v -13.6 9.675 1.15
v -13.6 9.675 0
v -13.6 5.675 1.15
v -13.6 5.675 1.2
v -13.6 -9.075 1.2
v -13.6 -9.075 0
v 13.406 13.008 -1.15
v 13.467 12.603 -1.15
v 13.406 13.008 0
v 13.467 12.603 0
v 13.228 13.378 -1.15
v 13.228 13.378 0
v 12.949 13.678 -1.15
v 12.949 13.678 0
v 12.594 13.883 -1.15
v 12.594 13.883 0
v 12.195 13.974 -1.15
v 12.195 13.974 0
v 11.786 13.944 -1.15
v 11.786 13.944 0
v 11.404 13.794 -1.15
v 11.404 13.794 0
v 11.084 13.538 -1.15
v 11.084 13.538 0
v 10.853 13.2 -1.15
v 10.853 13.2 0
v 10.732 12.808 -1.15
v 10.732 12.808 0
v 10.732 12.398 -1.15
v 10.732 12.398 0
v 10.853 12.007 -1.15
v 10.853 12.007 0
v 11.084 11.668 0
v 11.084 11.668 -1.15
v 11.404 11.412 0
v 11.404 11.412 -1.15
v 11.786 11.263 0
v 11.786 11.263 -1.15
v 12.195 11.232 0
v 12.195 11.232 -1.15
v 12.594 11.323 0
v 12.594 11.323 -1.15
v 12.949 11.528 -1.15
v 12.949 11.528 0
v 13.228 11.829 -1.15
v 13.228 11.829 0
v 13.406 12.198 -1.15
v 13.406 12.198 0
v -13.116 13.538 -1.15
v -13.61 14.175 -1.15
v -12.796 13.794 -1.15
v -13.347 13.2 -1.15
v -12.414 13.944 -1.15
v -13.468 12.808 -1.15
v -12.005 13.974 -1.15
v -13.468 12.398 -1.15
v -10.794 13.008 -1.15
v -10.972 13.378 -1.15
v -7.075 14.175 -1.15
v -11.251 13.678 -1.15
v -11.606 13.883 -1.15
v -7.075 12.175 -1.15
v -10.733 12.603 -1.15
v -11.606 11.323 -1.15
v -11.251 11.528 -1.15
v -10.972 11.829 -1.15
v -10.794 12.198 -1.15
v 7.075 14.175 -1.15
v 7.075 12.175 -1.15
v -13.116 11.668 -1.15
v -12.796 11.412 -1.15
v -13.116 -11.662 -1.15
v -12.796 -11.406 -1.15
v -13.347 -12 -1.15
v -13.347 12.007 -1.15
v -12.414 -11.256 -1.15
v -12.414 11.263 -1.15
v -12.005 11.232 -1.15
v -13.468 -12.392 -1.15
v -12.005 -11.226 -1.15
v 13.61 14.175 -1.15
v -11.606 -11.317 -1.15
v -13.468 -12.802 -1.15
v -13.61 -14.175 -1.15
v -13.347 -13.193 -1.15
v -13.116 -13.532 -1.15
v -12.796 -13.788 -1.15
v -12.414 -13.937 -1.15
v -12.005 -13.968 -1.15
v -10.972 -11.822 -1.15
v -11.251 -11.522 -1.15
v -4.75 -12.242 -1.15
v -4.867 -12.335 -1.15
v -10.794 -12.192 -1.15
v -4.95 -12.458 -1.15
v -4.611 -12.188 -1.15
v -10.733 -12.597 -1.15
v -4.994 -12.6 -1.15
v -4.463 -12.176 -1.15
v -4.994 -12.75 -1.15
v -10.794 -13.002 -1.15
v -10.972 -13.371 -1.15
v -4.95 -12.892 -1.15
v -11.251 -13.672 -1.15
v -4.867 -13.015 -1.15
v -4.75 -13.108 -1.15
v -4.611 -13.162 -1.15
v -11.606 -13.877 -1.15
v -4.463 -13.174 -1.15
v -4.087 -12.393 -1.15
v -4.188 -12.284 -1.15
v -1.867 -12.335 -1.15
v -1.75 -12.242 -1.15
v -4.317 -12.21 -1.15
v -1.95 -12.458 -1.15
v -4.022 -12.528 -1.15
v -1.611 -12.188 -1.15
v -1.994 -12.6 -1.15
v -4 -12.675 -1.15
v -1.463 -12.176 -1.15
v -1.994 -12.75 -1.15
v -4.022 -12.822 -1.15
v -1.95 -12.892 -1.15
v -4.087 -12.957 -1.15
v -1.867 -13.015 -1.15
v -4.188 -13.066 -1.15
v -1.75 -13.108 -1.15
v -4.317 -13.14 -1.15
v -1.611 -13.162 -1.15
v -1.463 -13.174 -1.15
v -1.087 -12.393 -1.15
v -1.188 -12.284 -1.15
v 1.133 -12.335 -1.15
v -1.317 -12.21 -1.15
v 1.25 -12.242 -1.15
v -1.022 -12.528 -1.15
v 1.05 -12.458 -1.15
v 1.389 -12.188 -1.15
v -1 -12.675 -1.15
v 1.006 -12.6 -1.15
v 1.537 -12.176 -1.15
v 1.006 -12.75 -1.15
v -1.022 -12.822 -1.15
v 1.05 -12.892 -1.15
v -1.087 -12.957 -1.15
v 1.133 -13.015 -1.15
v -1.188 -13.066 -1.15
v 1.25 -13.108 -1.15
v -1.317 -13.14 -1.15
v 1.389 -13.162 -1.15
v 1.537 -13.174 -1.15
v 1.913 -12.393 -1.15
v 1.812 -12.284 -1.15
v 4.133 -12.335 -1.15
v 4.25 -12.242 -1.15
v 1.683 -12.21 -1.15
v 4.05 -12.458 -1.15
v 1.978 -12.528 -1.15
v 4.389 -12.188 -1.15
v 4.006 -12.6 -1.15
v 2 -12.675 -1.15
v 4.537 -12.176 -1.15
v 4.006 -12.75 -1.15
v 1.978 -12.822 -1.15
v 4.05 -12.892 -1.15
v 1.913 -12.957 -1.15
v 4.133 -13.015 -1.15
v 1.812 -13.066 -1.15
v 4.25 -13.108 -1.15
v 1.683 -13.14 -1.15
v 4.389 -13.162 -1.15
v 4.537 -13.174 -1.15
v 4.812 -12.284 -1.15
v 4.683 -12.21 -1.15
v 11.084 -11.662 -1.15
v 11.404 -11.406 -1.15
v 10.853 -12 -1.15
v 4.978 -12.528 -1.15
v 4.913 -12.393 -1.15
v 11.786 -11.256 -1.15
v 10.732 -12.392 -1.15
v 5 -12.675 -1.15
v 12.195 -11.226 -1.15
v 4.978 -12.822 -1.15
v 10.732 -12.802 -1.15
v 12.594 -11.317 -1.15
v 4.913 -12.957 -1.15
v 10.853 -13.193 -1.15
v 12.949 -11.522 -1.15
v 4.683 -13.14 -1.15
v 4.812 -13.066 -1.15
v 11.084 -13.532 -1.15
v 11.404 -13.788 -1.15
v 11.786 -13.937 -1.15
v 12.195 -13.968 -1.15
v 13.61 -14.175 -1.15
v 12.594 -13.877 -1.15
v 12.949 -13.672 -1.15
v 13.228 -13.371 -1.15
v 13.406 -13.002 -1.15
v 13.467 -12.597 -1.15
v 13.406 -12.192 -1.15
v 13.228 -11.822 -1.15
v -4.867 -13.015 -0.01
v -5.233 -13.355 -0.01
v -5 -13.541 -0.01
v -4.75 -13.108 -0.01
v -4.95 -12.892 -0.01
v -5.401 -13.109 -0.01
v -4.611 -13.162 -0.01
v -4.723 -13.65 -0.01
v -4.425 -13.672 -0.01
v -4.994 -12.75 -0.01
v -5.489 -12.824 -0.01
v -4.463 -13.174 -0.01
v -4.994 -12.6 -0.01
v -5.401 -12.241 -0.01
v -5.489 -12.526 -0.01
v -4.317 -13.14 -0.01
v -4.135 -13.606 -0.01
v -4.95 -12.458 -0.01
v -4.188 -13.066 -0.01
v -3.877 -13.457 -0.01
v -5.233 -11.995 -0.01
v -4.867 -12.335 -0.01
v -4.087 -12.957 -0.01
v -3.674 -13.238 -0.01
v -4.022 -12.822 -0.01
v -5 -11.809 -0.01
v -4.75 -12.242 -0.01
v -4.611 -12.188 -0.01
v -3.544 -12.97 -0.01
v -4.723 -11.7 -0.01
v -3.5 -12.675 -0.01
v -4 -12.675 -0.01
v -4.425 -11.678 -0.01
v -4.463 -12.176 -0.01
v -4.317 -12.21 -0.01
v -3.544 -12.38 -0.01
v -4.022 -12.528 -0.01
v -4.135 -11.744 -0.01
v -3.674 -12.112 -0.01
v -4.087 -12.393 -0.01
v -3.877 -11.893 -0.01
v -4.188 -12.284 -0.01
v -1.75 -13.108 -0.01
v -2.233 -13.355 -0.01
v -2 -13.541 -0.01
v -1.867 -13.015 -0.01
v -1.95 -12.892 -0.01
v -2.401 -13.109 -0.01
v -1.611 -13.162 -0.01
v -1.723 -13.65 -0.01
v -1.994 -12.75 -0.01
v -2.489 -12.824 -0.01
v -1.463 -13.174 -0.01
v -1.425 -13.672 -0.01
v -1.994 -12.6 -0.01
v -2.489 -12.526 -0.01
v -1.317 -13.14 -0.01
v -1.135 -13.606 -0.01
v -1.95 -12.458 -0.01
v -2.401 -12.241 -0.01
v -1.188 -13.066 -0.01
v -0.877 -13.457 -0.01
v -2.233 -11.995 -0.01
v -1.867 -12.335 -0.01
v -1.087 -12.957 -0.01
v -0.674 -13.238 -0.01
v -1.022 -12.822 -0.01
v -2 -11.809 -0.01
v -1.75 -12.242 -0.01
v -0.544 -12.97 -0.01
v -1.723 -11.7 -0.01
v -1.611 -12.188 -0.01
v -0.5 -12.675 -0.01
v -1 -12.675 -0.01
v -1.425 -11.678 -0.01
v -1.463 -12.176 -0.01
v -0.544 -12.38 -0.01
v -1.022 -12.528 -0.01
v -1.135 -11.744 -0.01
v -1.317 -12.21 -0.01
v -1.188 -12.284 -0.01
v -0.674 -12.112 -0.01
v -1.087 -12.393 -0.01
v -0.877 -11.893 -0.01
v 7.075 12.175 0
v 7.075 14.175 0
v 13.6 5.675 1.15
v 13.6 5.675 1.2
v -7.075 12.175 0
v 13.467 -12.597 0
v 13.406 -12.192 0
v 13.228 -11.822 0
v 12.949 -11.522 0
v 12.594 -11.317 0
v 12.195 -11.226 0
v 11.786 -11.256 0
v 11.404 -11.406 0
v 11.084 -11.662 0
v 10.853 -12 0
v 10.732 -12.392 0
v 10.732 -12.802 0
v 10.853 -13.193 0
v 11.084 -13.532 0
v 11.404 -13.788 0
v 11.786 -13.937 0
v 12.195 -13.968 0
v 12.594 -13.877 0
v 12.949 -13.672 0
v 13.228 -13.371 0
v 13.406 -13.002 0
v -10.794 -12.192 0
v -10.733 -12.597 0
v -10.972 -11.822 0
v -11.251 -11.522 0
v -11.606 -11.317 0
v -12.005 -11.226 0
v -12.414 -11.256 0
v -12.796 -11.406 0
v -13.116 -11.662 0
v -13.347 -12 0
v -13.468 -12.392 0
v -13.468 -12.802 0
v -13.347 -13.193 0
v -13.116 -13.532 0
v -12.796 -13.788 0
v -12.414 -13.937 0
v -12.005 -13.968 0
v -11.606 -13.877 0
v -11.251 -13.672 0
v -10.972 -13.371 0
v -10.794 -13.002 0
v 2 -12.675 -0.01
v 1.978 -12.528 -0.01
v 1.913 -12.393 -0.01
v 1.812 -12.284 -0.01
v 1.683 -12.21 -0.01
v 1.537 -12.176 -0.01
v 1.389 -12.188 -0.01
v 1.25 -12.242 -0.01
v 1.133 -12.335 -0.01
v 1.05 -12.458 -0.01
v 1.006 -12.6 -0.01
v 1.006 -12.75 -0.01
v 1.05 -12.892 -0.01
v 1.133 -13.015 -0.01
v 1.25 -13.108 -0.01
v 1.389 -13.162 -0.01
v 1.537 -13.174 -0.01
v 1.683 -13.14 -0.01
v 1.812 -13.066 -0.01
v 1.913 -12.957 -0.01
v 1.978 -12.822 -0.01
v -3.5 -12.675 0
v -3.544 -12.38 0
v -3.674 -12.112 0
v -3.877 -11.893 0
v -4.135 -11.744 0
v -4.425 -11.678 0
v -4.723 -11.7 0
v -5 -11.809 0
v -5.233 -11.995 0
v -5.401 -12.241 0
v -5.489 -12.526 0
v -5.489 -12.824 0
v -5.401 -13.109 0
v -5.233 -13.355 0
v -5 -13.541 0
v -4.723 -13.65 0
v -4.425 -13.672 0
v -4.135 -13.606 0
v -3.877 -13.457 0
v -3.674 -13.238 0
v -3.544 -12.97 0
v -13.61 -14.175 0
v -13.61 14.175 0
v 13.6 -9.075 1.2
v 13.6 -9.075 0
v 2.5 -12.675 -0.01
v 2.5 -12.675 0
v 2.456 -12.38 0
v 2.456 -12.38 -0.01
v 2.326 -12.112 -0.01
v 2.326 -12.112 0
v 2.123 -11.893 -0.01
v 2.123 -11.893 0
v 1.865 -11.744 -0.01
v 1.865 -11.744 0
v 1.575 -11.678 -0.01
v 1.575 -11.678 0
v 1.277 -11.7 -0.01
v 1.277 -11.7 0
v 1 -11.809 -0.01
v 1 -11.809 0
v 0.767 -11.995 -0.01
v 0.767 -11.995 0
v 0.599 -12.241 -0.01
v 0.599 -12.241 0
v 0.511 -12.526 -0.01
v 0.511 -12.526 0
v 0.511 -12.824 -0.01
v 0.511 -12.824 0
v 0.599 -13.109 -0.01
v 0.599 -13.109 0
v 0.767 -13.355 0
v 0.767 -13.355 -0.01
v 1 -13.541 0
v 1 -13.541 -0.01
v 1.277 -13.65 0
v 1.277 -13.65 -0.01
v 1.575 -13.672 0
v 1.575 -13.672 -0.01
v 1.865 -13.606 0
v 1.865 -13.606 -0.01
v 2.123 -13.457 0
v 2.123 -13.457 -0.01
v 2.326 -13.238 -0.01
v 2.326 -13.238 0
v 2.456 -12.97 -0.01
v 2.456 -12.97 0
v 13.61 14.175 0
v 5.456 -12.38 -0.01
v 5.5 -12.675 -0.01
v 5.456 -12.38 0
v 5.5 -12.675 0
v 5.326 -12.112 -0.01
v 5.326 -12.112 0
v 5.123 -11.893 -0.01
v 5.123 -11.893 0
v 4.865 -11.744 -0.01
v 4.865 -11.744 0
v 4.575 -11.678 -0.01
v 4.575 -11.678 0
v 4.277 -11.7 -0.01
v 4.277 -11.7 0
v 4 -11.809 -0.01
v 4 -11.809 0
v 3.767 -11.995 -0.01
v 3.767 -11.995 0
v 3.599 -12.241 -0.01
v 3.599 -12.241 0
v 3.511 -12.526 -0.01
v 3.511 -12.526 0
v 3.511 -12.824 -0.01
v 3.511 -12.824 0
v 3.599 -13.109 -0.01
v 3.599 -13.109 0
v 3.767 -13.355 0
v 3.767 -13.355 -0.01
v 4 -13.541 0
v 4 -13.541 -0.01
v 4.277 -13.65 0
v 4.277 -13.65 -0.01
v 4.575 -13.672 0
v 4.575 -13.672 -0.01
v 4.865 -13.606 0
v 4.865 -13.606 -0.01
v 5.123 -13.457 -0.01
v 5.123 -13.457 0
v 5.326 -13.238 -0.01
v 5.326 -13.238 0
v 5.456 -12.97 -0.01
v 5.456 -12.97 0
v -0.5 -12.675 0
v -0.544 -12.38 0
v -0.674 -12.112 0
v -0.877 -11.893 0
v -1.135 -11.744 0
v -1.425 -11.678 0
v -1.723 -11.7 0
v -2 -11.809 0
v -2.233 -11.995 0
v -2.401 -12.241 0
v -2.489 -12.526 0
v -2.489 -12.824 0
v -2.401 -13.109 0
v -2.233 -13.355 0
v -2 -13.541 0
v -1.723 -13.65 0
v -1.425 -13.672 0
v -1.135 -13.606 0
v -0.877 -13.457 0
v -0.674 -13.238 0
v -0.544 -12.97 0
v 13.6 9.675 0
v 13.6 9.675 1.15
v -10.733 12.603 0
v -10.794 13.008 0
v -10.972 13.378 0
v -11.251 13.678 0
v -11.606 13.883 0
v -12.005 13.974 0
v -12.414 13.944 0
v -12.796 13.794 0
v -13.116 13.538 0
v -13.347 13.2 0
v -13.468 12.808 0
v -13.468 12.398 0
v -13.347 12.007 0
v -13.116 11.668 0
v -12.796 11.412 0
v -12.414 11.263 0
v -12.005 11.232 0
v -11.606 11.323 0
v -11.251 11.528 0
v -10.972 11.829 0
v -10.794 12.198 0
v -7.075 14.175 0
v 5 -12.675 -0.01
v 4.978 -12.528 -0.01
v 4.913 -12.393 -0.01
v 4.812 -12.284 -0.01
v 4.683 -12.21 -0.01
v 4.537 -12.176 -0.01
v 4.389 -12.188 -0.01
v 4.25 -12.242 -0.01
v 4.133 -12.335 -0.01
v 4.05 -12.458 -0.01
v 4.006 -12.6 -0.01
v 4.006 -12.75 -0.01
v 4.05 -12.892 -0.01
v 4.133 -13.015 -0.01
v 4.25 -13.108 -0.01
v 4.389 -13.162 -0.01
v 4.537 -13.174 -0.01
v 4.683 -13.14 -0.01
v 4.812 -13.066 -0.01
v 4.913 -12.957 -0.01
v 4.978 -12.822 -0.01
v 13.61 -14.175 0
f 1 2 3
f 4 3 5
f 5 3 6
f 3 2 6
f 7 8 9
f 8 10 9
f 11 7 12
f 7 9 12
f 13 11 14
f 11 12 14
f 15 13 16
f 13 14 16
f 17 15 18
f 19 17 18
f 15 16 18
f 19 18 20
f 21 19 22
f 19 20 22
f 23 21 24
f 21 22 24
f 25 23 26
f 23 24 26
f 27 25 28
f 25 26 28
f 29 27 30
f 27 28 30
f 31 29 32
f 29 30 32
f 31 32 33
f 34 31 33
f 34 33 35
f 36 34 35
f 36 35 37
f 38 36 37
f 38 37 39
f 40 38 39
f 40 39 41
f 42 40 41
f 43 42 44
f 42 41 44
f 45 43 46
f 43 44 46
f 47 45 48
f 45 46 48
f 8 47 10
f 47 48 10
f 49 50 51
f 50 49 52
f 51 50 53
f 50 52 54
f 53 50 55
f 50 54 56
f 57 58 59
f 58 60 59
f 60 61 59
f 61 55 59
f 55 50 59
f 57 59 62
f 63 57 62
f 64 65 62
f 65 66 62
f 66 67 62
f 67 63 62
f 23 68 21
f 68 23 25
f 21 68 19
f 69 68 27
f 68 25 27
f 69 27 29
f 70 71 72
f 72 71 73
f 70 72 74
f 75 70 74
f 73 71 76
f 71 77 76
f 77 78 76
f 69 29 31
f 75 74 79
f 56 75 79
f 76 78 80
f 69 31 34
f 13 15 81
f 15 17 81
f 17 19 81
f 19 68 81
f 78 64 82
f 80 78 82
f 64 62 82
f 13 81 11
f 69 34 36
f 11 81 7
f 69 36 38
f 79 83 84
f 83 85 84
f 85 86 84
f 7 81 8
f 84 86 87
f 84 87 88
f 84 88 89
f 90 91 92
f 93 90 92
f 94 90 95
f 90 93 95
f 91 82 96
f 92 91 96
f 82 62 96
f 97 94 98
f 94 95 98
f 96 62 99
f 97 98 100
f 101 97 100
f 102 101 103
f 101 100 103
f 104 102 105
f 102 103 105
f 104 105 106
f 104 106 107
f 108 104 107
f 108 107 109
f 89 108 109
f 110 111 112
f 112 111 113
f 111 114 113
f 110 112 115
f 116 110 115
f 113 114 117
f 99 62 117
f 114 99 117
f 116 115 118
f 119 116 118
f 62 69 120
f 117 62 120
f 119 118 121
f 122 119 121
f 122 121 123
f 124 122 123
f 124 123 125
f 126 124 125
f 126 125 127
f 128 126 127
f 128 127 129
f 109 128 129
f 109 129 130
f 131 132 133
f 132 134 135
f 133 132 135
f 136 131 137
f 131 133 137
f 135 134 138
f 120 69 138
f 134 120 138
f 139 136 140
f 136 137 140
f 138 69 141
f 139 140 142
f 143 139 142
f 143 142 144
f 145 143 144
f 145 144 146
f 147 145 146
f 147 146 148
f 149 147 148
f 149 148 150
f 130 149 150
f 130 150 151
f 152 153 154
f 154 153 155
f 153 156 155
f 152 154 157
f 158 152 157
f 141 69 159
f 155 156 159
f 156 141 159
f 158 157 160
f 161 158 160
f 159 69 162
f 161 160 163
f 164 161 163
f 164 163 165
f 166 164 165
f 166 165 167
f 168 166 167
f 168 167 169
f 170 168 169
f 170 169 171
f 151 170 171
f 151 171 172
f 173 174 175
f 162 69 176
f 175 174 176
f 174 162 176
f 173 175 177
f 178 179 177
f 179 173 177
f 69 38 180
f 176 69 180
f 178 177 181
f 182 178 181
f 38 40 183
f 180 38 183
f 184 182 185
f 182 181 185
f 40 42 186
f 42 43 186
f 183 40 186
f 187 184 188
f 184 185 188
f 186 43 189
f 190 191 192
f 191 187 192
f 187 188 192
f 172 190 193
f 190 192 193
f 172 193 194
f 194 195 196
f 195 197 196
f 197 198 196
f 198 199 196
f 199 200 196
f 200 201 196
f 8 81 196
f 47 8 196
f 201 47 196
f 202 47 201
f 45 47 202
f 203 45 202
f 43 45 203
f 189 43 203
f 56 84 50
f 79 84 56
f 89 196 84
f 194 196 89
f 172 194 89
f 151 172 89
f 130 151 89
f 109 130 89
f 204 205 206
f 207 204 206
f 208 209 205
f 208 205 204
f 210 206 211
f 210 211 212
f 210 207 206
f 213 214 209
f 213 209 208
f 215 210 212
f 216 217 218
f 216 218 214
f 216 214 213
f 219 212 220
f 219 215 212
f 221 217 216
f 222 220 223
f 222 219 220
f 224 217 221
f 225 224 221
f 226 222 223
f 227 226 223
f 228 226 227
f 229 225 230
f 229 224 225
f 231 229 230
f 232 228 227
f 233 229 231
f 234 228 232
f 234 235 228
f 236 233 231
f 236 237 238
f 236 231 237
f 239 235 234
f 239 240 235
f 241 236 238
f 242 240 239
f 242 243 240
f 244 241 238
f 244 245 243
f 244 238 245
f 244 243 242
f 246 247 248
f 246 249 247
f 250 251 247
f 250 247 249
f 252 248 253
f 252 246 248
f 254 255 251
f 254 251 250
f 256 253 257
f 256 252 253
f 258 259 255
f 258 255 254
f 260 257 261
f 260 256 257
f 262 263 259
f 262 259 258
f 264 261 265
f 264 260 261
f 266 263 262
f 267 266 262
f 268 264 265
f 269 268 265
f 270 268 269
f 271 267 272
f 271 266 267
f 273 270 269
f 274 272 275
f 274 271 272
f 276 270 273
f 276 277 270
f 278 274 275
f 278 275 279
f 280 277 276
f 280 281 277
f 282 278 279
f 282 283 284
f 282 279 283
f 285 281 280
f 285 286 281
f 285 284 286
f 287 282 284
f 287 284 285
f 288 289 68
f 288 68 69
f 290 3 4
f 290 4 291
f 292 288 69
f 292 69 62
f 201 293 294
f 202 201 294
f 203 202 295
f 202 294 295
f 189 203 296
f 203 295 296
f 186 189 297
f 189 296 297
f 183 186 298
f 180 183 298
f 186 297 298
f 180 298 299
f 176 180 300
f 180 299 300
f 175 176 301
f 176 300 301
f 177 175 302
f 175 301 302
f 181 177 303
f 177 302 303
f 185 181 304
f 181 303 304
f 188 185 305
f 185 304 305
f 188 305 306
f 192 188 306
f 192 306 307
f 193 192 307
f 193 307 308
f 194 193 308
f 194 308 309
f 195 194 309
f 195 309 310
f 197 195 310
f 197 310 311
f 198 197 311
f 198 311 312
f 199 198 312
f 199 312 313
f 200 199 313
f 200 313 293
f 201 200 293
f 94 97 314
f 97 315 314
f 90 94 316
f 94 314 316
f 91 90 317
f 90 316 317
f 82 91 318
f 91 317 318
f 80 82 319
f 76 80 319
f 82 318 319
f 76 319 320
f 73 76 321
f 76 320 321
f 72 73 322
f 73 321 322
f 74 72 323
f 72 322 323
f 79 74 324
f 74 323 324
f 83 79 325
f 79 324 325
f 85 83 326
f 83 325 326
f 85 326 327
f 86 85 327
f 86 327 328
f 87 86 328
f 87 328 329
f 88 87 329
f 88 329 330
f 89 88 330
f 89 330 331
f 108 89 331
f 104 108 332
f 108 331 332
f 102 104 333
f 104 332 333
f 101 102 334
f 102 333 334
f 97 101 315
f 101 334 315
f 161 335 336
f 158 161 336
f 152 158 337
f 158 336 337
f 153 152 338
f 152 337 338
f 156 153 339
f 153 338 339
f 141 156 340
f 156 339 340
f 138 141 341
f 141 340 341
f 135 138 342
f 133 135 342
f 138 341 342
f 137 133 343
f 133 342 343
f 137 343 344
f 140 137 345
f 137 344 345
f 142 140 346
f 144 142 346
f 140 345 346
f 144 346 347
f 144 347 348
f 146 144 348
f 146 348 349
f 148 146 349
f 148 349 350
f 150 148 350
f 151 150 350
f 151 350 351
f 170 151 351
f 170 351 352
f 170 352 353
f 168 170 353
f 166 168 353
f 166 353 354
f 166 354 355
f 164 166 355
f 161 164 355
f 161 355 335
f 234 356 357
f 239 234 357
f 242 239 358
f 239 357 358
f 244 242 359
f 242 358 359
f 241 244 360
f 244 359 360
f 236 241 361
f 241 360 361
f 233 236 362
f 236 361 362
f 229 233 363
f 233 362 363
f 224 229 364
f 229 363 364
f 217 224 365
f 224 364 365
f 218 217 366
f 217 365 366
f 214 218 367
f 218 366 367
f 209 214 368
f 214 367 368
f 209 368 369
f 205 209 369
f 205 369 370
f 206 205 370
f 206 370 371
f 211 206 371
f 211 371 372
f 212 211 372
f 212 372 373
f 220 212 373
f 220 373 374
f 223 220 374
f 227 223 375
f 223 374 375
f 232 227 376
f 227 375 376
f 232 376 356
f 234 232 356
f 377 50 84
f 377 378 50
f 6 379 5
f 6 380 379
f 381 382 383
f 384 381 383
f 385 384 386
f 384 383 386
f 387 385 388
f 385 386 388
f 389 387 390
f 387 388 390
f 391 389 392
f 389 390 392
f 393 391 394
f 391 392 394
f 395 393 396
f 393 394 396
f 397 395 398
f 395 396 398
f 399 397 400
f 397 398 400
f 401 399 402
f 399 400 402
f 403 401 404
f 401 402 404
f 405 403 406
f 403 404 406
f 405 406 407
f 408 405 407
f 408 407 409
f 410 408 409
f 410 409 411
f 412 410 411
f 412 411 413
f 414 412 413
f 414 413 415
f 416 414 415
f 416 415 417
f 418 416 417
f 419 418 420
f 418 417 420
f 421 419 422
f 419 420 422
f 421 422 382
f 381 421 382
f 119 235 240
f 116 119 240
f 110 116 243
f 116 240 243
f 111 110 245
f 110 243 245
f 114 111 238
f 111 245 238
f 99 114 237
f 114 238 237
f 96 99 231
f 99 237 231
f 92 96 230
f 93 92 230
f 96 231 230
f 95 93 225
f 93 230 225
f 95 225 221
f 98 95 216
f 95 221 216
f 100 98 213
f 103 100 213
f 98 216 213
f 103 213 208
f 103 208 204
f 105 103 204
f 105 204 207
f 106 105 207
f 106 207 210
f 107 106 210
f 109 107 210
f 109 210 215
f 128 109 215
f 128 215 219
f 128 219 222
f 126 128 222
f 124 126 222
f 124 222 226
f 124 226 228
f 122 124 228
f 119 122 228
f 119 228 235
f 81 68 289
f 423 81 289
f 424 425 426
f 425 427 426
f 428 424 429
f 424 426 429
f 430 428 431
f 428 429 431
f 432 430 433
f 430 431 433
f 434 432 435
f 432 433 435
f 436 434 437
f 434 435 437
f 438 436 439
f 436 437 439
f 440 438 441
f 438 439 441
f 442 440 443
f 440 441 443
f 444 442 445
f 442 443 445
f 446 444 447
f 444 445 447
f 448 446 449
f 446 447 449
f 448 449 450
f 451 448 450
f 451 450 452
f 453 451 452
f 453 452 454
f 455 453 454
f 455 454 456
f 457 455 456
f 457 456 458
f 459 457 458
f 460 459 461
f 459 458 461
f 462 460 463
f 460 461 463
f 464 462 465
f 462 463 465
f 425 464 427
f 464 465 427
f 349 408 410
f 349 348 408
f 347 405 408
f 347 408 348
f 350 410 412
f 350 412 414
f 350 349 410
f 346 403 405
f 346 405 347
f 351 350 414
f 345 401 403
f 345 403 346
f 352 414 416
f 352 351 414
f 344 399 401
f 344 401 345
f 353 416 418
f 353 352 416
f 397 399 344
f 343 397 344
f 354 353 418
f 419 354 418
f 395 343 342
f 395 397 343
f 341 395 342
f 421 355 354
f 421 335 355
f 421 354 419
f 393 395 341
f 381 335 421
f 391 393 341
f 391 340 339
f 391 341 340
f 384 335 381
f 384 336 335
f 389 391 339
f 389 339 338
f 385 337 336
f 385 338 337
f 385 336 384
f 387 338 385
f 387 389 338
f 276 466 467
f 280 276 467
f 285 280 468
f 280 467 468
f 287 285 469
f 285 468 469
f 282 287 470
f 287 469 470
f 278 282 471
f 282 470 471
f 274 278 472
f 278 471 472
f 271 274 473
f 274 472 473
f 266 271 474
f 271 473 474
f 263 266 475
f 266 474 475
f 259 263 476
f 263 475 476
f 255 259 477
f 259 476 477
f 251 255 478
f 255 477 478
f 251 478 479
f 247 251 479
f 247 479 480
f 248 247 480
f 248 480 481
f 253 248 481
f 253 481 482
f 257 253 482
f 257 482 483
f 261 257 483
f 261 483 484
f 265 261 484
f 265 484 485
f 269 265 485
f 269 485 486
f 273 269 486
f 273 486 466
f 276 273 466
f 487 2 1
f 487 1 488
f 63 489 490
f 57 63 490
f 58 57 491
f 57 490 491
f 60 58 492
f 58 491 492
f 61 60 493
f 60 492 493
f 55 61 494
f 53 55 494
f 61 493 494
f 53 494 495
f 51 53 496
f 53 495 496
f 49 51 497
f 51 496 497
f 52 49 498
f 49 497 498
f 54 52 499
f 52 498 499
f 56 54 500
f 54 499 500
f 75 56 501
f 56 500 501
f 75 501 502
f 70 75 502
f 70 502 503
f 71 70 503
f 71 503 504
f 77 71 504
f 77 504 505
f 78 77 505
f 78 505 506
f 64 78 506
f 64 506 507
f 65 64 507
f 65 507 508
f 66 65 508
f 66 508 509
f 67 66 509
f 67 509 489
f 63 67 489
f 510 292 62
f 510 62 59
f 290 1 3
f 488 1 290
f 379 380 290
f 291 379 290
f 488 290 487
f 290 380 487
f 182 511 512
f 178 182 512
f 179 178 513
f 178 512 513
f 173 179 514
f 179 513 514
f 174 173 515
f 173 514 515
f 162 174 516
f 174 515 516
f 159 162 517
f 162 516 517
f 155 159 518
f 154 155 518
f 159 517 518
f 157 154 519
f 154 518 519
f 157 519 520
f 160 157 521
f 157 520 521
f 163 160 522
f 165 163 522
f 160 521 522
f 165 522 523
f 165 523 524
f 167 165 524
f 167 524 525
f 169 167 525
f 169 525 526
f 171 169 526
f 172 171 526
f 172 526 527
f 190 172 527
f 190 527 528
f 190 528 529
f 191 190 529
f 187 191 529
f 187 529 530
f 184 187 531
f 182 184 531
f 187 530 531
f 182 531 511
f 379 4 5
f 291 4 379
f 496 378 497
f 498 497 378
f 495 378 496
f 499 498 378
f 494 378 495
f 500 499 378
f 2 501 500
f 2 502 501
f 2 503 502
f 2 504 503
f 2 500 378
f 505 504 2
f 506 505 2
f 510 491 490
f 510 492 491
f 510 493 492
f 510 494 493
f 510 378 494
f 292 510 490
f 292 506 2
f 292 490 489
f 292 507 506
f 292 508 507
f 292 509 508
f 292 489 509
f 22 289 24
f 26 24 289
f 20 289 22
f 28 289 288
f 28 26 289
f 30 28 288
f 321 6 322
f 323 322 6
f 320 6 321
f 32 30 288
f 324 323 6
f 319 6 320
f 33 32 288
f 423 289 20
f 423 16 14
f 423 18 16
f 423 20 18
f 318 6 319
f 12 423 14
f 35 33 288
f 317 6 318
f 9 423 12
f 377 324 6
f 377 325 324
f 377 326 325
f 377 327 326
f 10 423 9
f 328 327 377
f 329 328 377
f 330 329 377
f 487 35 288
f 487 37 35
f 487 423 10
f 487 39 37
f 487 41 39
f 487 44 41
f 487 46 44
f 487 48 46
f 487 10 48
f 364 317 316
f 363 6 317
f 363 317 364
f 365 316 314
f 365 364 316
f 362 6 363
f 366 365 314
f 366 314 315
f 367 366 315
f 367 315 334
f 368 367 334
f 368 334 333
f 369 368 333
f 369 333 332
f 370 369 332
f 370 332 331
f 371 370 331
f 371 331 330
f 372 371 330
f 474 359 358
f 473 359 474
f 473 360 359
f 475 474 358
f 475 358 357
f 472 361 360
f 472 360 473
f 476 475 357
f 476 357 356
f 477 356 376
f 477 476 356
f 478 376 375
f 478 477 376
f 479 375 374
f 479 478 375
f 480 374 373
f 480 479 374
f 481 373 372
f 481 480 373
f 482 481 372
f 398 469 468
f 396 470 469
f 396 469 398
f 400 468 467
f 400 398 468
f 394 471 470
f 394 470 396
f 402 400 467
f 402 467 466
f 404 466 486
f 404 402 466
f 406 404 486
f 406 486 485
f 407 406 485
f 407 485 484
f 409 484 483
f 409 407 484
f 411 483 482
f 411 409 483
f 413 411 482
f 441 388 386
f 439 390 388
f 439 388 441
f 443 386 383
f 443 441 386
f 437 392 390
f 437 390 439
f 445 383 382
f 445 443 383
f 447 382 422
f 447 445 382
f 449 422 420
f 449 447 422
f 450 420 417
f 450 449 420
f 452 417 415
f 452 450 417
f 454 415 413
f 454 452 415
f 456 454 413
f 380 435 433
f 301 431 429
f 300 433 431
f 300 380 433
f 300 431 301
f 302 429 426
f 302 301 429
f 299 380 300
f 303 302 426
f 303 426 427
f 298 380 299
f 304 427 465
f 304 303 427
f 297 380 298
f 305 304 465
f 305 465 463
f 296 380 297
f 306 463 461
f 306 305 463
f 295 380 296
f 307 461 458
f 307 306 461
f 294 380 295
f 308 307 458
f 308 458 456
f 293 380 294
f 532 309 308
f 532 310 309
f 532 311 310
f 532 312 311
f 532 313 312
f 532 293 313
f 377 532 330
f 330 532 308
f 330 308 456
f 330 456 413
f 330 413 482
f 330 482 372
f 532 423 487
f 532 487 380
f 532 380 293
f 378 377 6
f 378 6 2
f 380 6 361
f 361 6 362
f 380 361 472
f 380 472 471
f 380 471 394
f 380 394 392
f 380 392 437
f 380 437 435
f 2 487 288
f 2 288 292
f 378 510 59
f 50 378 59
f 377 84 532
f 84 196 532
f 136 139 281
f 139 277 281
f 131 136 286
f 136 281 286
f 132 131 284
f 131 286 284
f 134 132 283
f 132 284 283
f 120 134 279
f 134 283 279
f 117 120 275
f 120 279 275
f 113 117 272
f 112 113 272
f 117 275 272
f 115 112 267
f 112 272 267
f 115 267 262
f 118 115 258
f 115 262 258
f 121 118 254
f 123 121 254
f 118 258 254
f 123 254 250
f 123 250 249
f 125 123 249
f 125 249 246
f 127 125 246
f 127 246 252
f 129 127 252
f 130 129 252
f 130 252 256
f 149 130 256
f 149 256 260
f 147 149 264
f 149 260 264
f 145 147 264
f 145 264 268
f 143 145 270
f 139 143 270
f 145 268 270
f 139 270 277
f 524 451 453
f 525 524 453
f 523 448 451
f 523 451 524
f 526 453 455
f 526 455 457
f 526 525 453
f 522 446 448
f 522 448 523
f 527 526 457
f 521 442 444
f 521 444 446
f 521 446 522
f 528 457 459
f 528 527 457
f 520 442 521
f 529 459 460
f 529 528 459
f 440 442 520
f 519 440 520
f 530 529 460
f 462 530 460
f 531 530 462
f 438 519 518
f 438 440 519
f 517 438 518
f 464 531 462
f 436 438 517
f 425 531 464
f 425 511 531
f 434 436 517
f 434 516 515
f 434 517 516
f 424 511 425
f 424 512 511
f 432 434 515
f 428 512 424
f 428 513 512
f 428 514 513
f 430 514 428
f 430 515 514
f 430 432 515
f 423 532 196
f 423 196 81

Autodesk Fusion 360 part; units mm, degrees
sketch "Sketch1" plane through (0, 0, 0) normal (0, 0, 1) x (1, 0, 0)
  line L0 (13.6, 14.175) -> (-13.6, 14.175)
  line L1 (-13.6, 14.175) -> (-13.6, -14.175)
  line L2 (-13.6, -14.175) -> (13.6, -14.175)
  line L3 (13.6, -14.175) -> (13.6, 14.175)
  line L4 (13.6, 14.175) -> (-13.6, -14.175) construction
  line L5 (-13.6, 14.175) -> (13.6, -14.175) construction
  line L6 (-7.075, 14.175) -> (7.075, 14.175)
  line L7 (7.075, 14.175) -> (7.075, 12.175)
  line L8 (7.075, 12.175) -> (-7.075, 12.175)
  line L9 (-7.075, 12.175) -> (-7.075, 14.175)
  line L10 (-13.6, 9.675) -> (13.6, 9.675)
  line L11 (13.6, 9.675) -> (13.6, -9.075)
  line L12 (13.6, -9.075) -> (-13.6, -9.075)
  line L13 (-13.6, -9.075) -> (-13.6, 9.675)
  line L14 (-13.6, 5.675) -> (13.6, 5.675)
  circle A0 centre (12.0919, 12.6032) radius 1.375
  circle A1 centre (-4.5, -12.675) radius 1
  circle A2 centre (-4.5, -12.675) radius 1
  circle A3 centre (-1.5, -12.675) radius 1
  circle A4 centre (1.5, -12.675) radius 1
  circle A5 centre (4.5, -12.675) radius 1
  line L15 (-4.5, -12.675) -> (4.5, -12.675) construction
  line L16 (0, -14.175) -> (0, -11.175) construction
  circle A6 centre (-4.5, -12.675) radius 0.5
  circle A7 centre (-1.5, -12.675) radius 0.5
  circle A8 centre (1.5, -12.675) radius 0.5
  circle A9 centre (4.5, -12.675) radius 0.5
  circle A10 centre (-12.1081, 12.6032) radius 1.375
  circle A11 centre (12.0919, -12.5968) radius 1.375
  circle A12 centre (-12.1081, -12.5968) radius 1.375
  dimension "d1" = 27.2
  dimension "d2" = 28.35
  dimension "d3" = 14.15
  dimension "d4" = 2
  dimension "d5" = 18.75
  dimension "d6" = 4.5
  dimension "d7" = 4
  dimension "d8" = 2.75
  dimension "d22" = 2
  dimension "d23" = 2
  dimension "d26" = 3
  dimension "d27" = 0
  dimension "d30" = 3
  dimension "d31" = 1
  dimension "d36" = -24.2
  dimension "d37" = -25.2
extrude "Extrude1" add sketch "Sketch1" against normal blind 1.15 contours L0 L1 L3 L7 L8 L9 L10 | L1 L3 L10 L11 L13 L14 | L1 L3 L11 L12 L13 L14 | L1 L2 L3 L12 | A1 A2 | A3 | A4 | A5
extrude "Extrude2" add sketch "Sketch1" along normal blind 1.15 contours L1 L3 L10 L11 L13 L14
extrude "Extrude3" add sketch "Sketch1" along normal blind 1.2 contours L1 L3 L11 L12 L13 L14
sketch "Sketch2" plane through (13.6, 0, 0) normal (1, 0, 0) x (0, 1, 0)
  line L0 (-9.075, 0) -> (-14.175, 0)
  line L1 (-14.175, 0) -> (-14.175, -1.15)
  line L2 (-14.175, -1.15) -> (14.175, -1.15)
  line L3 (14.175, -1.15) -> (14.175, 0)
  line L4 (14.175, 0) -> (9.675, 0)
  line L5 (9.675, 0) -> (9.675, 1.15)
  line L6 (9.675, 1.15) -> (5.675, 1.15)
  line L7 (5.675, 1.15) -> (5.675, 1.2)
  line L8 (5.675, 1.2) -> (-9.075, 1.2)
  line L9 (-9.075, 1.2) -> (-9.075, 0)
  line L10 (-9.075, 0) -> (9.675, 0)
extrude "Extrude4" add sketch "Sketch2" along normal blind 0.01 contours L0 L1 L2 L3 L4 L10
sketch "Sketch3" plane through (-13.6, 0, 0) normal (-1, 0, 0) x (0, -1, 0)
  line L0 (-9.675, 0) -> (-14.175, 0)
  line L1 (-14.175, 0) -> (-14.175, -1.15)
  line L2 (-14.175, -1.15) -> (14.175, -1.15)
  line L3 (14.175, -1.15) -> (14.175, 0)
  line L4 (14.175, 0) -> (9.075, 0)
  line L5 (9.075, 0) -> (9.075, 1.2)
  line L6 (9.075, 1.2) -> (-5.675, 1.2)
  line L7 (-5.675, 1.2) -> (-5.675, 1.15)
  line L8 (-5.675, 1.15) -> (-9.675, 1.15)
  line L9 (-9.675, 1.15) -> (-9.675, 0)
  line L10 (-9.675, 0) -> (9.075, 0)
extrude "Extrude5" add sketch "Sketch3" along normal blind 0.01 contours L0 L1 L2 L3 L4 L10
extrude "Extrude6" cut sketch "Sketch1" against normal blind 0.01 contours A1 A2 | A3 | A4 | A5
equation "d26 = 1 mm + 2 mm"
